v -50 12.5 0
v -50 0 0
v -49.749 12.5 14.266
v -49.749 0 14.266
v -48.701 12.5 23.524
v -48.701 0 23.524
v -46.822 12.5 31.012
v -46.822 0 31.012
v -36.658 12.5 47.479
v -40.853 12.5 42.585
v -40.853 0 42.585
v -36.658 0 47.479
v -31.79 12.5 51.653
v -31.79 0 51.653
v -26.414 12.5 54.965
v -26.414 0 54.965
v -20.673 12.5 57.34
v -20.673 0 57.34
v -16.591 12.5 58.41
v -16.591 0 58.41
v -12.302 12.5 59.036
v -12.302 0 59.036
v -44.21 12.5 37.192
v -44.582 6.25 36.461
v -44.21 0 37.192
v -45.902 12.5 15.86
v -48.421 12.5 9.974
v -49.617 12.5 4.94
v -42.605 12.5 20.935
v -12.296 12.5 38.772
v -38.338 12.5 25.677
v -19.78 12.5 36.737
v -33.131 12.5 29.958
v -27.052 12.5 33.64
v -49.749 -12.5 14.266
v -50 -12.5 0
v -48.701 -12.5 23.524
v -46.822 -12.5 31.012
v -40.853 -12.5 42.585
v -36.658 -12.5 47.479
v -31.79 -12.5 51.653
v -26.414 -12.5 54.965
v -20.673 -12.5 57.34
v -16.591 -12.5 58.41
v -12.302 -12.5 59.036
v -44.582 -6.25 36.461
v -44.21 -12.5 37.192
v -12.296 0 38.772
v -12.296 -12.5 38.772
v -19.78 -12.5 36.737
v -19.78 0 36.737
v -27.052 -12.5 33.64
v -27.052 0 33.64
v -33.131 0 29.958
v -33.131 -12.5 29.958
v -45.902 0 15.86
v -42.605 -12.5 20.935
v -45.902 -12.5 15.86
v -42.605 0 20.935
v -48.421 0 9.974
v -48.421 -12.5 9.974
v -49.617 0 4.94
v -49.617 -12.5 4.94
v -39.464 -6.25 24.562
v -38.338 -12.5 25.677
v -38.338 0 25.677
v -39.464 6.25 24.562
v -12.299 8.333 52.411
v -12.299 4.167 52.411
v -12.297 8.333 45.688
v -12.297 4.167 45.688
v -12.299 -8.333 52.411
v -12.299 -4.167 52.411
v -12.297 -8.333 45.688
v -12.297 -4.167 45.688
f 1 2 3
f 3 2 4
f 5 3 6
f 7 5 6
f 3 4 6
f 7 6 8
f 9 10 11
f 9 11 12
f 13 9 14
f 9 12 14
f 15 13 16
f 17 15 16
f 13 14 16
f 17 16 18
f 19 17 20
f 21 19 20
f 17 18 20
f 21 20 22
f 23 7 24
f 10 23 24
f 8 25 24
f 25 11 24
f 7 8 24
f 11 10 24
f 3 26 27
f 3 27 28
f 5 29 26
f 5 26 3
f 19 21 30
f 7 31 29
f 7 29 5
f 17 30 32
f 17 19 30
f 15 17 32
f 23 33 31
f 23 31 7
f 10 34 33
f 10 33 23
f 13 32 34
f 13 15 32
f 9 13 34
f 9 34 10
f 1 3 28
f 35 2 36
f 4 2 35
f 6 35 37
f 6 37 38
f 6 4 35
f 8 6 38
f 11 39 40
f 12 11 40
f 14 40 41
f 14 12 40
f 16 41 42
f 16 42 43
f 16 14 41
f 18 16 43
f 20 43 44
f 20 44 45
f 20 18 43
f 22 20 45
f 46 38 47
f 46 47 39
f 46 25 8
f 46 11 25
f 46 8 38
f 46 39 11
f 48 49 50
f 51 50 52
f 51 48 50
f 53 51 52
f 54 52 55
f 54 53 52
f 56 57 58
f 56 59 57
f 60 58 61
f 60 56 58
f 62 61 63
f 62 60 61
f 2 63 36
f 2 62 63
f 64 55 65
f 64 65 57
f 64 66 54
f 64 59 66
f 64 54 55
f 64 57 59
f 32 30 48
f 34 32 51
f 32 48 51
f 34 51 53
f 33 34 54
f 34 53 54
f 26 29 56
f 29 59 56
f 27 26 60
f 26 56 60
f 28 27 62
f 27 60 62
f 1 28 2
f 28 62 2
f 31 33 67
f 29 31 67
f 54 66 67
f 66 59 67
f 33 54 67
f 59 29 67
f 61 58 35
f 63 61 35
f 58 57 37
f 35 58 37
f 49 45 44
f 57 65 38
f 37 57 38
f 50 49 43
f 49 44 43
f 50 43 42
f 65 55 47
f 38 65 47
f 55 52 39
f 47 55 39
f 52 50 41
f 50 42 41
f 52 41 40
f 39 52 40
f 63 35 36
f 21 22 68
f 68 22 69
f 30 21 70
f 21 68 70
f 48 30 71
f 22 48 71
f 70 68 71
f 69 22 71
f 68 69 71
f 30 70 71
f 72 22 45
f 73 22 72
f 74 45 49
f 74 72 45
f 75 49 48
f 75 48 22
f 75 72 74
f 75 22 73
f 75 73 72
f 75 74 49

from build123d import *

# Parameters (mm, degrees)
F1_DEPTH = 12.5


with BuildPart() as f1:
    # F0 (on Front) → F1 (new body, symmetric)
    with BuildSketch(Plane.XZ):
        with BuildLine():
            add(Edge.make_bspline(
                [(-50, 0), (-50.0407398567, 12.683133187), (-50.1235942028, 38.4773502806), (-27.2922330655, 57.7014225305), (-12.3019693419, 59.0356364846)],
                knots=[0, 0, 0, 0, 0.2331907275, 0.4742497111, 0.4742497111, 0.4742497111, 0.4742497111], degree=3))
            add(Edge.make_bspline(
                [(-12.2957733851, 38.7716511435), (-50, 31.1190061835), (-50, 0)],
                knots=[1.8192603775, 1.8192603775, 1.8192603775, 3.1415926536, 3.1415926536, 3.1415926536], degree=2, weights=[1, 0.7892767156, 1]))
            add(Edge.make_bspline(
                [(-12.3019693419, 59.0356364846), (-12.2990112342, 52.4271155186), (-12.2963394707, 45.8169153956), (-12.2957733851, 38.7716511435)],
                knots=[0, 0, 0, 0, 0.2005574694, 0.2005574694, 0.2005574694, 0.2005574694], degree=3))
        make_face()
    extrude(amount=F1_DEPTH, both=True)


solid = f1.part
